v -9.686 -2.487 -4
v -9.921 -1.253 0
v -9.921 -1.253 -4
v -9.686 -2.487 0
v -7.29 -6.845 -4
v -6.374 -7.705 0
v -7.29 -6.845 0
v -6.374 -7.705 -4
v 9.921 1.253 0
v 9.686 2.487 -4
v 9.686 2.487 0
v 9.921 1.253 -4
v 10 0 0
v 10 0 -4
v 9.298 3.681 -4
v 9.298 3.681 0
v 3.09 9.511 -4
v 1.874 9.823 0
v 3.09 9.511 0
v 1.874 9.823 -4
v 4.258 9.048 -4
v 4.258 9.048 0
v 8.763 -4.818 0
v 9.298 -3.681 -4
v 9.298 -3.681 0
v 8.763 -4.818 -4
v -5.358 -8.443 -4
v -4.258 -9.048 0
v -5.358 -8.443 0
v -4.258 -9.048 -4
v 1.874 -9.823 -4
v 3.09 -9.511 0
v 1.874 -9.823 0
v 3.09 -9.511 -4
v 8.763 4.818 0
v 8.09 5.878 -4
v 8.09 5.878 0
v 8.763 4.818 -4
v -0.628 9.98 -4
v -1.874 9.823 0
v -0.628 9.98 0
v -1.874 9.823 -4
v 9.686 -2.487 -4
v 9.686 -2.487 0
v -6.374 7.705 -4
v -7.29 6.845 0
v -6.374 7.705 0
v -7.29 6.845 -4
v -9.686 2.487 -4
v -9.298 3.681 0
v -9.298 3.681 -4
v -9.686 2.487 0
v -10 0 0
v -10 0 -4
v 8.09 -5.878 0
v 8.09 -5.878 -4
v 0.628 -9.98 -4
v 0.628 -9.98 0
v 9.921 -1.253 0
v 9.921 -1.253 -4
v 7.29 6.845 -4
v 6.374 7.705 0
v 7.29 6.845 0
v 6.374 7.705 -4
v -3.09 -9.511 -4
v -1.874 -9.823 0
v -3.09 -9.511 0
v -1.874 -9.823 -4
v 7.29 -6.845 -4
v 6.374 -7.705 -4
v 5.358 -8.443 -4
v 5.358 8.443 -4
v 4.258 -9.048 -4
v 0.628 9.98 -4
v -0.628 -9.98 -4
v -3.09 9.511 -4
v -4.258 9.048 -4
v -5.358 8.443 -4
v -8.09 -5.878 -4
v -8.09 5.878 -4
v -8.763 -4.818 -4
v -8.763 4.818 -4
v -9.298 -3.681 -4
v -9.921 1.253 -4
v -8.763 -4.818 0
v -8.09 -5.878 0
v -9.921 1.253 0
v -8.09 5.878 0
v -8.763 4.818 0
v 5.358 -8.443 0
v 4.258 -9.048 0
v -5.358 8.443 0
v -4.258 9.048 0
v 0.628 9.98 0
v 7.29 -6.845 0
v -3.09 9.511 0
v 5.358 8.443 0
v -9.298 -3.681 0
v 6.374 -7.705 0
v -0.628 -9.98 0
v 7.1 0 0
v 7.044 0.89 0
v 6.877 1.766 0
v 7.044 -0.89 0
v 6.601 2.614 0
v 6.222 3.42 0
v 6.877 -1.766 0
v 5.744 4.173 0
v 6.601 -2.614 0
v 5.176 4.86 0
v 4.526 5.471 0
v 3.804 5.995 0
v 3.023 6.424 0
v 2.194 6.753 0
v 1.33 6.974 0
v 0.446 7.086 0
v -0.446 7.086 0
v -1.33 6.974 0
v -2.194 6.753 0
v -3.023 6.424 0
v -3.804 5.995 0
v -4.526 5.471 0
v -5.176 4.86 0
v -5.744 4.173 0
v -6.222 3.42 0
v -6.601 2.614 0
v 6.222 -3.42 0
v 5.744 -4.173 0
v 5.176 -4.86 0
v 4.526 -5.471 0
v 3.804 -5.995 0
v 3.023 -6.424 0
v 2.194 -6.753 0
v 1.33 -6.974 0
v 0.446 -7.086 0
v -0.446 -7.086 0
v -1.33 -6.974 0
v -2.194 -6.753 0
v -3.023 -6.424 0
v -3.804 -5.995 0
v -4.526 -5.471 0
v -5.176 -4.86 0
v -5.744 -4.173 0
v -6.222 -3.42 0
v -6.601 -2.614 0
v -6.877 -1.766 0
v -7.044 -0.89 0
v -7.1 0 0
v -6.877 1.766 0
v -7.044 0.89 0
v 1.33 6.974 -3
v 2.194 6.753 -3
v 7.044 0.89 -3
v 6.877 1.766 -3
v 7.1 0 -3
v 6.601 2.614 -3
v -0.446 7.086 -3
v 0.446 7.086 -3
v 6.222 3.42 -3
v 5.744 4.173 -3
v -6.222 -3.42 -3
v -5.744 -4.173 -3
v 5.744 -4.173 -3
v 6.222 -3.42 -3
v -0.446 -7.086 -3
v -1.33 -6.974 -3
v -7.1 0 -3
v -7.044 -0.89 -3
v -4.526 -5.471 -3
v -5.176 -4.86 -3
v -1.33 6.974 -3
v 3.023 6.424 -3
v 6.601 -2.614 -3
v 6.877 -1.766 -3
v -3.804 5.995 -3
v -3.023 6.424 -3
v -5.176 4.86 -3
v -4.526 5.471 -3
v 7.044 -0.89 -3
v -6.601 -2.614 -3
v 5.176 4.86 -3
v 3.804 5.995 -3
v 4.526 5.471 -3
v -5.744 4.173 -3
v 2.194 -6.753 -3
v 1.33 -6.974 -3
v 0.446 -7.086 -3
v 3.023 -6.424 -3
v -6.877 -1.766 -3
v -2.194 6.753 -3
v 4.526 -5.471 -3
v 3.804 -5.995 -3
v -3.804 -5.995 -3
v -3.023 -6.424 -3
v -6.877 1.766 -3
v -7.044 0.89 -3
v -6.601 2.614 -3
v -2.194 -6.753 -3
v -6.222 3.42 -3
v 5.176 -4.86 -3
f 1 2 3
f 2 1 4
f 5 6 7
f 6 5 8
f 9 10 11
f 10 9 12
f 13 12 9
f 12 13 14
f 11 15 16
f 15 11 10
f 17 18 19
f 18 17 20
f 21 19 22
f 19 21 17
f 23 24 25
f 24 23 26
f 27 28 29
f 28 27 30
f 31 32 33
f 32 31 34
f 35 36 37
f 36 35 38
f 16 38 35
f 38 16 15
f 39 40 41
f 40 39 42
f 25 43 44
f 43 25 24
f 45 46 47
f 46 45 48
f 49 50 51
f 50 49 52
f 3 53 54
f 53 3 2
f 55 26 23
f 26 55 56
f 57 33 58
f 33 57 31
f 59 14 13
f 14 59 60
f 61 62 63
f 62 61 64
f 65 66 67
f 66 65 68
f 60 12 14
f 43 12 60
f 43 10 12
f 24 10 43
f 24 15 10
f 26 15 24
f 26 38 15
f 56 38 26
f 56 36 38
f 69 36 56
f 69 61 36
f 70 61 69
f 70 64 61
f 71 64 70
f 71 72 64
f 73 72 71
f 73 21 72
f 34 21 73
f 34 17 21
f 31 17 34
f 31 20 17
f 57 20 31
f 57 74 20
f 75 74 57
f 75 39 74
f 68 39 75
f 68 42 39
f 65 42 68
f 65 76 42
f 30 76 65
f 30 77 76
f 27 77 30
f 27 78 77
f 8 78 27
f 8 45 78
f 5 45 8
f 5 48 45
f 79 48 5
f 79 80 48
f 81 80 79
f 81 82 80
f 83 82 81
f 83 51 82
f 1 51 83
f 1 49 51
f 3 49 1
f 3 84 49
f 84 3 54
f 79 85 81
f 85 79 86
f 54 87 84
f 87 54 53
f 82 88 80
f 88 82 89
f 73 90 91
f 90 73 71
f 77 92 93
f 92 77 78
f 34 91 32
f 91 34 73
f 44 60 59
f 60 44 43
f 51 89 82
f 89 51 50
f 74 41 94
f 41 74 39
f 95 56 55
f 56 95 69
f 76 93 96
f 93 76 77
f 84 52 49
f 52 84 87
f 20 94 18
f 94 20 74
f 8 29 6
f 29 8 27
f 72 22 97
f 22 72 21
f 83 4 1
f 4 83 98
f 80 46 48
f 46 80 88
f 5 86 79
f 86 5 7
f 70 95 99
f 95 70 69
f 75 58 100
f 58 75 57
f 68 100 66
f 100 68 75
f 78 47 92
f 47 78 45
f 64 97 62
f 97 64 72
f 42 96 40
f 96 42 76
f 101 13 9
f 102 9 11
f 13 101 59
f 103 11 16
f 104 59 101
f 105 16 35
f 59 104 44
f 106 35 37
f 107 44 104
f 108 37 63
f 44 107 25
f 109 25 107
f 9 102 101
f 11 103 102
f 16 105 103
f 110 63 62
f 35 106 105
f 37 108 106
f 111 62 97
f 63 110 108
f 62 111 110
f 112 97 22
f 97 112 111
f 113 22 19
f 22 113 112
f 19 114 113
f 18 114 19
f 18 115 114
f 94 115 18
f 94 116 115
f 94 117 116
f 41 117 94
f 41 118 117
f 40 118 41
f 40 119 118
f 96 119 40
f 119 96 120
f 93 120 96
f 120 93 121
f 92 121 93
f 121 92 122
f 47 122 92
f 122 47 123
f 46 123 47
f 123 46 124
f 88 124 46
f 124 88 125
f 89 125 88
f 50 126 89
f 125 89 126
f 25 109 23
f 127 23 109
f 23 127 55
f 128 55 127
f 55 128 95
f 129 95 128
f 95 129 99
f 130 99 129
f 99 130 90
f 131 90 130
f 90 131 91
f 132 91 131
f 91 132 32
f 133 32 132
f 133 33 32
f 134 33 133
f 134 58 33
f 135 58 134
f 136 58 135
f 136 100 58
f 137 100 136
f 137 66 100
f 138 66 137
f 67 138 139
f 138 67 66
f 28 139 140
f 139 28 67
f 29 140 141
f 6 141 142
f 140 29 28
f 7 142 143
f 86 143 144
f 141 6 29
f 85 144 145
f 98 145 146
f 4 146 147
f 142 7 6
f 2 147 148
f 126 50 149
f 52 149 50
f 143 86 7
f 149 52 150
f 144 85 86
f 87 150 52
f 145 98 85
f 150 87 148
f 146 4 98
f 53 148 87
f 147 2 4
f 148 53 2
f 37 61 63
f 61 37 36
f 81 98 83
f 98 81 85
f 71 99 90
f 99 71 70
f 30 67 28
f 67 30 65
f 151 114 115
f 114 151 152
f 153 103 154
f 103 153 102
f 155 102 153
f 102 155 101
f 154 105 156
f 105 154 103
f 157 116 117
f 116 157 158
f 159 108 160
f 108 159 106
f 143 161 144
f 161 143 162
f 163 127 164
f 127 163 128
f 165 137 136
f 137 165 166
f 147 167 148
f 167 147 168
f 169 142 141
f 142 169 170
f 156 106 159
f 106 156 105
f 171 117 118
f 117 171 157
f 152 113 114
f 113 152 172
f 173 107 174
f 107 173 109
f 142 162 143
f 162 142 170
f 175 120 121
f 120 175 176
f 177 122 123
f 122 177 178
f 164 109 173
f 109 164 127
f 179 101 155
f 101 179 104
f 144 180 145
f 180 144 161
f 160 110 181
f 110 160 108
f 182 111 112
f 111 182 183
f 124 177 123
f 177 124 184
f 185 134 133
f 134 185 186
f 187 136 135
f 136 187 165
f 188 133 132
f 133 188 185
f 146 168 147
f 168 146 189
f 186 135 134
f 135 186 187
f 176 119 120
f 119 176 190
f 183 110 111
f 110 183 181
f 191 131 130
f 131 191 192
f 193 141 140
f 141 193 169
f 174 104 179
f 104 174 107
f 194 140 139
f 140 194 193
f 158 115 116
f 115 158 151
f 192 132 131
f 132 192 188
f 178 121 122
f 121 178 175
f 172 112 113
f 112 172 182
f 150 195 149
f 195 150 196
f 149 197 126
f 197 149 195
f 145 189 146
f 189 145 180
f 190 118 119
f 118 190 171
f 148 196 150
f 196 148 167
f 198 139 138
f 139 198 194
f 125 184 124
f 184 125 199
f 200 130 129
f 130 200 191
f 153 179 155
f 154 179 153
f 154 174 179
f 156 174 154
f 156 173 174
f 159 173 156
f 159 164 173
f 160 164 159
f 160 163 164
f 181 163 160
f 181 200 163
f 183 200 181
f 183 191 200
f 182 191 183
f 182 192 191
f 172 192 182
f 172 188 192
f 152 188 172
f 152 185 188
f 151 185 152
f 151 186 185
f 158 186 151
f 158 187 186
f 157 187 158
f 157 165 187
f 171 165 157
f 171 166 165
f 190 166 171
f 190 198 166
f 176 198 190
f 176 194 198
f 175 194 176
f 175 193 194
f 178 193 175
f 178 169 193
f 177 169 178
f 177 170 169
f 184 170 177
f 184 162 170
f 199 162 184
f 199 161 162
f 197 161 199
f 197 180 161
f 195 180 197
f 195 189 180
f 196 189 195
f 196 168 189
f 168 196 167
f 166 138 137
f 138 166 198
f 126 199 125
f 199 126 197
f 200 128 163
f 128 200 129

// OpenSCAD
$fn = 50;


difference() {
	union() {
		translate(v = [0, 0, -4.0000000000]) {
			cylinder(h = 4, r = 10.0000000000);
		}
	}
	union() {
		#translate(v = [0, 0, -3.0000000000]) {
			cylinder(h = 3, r = 7.1000000000);
		}
	}
}
